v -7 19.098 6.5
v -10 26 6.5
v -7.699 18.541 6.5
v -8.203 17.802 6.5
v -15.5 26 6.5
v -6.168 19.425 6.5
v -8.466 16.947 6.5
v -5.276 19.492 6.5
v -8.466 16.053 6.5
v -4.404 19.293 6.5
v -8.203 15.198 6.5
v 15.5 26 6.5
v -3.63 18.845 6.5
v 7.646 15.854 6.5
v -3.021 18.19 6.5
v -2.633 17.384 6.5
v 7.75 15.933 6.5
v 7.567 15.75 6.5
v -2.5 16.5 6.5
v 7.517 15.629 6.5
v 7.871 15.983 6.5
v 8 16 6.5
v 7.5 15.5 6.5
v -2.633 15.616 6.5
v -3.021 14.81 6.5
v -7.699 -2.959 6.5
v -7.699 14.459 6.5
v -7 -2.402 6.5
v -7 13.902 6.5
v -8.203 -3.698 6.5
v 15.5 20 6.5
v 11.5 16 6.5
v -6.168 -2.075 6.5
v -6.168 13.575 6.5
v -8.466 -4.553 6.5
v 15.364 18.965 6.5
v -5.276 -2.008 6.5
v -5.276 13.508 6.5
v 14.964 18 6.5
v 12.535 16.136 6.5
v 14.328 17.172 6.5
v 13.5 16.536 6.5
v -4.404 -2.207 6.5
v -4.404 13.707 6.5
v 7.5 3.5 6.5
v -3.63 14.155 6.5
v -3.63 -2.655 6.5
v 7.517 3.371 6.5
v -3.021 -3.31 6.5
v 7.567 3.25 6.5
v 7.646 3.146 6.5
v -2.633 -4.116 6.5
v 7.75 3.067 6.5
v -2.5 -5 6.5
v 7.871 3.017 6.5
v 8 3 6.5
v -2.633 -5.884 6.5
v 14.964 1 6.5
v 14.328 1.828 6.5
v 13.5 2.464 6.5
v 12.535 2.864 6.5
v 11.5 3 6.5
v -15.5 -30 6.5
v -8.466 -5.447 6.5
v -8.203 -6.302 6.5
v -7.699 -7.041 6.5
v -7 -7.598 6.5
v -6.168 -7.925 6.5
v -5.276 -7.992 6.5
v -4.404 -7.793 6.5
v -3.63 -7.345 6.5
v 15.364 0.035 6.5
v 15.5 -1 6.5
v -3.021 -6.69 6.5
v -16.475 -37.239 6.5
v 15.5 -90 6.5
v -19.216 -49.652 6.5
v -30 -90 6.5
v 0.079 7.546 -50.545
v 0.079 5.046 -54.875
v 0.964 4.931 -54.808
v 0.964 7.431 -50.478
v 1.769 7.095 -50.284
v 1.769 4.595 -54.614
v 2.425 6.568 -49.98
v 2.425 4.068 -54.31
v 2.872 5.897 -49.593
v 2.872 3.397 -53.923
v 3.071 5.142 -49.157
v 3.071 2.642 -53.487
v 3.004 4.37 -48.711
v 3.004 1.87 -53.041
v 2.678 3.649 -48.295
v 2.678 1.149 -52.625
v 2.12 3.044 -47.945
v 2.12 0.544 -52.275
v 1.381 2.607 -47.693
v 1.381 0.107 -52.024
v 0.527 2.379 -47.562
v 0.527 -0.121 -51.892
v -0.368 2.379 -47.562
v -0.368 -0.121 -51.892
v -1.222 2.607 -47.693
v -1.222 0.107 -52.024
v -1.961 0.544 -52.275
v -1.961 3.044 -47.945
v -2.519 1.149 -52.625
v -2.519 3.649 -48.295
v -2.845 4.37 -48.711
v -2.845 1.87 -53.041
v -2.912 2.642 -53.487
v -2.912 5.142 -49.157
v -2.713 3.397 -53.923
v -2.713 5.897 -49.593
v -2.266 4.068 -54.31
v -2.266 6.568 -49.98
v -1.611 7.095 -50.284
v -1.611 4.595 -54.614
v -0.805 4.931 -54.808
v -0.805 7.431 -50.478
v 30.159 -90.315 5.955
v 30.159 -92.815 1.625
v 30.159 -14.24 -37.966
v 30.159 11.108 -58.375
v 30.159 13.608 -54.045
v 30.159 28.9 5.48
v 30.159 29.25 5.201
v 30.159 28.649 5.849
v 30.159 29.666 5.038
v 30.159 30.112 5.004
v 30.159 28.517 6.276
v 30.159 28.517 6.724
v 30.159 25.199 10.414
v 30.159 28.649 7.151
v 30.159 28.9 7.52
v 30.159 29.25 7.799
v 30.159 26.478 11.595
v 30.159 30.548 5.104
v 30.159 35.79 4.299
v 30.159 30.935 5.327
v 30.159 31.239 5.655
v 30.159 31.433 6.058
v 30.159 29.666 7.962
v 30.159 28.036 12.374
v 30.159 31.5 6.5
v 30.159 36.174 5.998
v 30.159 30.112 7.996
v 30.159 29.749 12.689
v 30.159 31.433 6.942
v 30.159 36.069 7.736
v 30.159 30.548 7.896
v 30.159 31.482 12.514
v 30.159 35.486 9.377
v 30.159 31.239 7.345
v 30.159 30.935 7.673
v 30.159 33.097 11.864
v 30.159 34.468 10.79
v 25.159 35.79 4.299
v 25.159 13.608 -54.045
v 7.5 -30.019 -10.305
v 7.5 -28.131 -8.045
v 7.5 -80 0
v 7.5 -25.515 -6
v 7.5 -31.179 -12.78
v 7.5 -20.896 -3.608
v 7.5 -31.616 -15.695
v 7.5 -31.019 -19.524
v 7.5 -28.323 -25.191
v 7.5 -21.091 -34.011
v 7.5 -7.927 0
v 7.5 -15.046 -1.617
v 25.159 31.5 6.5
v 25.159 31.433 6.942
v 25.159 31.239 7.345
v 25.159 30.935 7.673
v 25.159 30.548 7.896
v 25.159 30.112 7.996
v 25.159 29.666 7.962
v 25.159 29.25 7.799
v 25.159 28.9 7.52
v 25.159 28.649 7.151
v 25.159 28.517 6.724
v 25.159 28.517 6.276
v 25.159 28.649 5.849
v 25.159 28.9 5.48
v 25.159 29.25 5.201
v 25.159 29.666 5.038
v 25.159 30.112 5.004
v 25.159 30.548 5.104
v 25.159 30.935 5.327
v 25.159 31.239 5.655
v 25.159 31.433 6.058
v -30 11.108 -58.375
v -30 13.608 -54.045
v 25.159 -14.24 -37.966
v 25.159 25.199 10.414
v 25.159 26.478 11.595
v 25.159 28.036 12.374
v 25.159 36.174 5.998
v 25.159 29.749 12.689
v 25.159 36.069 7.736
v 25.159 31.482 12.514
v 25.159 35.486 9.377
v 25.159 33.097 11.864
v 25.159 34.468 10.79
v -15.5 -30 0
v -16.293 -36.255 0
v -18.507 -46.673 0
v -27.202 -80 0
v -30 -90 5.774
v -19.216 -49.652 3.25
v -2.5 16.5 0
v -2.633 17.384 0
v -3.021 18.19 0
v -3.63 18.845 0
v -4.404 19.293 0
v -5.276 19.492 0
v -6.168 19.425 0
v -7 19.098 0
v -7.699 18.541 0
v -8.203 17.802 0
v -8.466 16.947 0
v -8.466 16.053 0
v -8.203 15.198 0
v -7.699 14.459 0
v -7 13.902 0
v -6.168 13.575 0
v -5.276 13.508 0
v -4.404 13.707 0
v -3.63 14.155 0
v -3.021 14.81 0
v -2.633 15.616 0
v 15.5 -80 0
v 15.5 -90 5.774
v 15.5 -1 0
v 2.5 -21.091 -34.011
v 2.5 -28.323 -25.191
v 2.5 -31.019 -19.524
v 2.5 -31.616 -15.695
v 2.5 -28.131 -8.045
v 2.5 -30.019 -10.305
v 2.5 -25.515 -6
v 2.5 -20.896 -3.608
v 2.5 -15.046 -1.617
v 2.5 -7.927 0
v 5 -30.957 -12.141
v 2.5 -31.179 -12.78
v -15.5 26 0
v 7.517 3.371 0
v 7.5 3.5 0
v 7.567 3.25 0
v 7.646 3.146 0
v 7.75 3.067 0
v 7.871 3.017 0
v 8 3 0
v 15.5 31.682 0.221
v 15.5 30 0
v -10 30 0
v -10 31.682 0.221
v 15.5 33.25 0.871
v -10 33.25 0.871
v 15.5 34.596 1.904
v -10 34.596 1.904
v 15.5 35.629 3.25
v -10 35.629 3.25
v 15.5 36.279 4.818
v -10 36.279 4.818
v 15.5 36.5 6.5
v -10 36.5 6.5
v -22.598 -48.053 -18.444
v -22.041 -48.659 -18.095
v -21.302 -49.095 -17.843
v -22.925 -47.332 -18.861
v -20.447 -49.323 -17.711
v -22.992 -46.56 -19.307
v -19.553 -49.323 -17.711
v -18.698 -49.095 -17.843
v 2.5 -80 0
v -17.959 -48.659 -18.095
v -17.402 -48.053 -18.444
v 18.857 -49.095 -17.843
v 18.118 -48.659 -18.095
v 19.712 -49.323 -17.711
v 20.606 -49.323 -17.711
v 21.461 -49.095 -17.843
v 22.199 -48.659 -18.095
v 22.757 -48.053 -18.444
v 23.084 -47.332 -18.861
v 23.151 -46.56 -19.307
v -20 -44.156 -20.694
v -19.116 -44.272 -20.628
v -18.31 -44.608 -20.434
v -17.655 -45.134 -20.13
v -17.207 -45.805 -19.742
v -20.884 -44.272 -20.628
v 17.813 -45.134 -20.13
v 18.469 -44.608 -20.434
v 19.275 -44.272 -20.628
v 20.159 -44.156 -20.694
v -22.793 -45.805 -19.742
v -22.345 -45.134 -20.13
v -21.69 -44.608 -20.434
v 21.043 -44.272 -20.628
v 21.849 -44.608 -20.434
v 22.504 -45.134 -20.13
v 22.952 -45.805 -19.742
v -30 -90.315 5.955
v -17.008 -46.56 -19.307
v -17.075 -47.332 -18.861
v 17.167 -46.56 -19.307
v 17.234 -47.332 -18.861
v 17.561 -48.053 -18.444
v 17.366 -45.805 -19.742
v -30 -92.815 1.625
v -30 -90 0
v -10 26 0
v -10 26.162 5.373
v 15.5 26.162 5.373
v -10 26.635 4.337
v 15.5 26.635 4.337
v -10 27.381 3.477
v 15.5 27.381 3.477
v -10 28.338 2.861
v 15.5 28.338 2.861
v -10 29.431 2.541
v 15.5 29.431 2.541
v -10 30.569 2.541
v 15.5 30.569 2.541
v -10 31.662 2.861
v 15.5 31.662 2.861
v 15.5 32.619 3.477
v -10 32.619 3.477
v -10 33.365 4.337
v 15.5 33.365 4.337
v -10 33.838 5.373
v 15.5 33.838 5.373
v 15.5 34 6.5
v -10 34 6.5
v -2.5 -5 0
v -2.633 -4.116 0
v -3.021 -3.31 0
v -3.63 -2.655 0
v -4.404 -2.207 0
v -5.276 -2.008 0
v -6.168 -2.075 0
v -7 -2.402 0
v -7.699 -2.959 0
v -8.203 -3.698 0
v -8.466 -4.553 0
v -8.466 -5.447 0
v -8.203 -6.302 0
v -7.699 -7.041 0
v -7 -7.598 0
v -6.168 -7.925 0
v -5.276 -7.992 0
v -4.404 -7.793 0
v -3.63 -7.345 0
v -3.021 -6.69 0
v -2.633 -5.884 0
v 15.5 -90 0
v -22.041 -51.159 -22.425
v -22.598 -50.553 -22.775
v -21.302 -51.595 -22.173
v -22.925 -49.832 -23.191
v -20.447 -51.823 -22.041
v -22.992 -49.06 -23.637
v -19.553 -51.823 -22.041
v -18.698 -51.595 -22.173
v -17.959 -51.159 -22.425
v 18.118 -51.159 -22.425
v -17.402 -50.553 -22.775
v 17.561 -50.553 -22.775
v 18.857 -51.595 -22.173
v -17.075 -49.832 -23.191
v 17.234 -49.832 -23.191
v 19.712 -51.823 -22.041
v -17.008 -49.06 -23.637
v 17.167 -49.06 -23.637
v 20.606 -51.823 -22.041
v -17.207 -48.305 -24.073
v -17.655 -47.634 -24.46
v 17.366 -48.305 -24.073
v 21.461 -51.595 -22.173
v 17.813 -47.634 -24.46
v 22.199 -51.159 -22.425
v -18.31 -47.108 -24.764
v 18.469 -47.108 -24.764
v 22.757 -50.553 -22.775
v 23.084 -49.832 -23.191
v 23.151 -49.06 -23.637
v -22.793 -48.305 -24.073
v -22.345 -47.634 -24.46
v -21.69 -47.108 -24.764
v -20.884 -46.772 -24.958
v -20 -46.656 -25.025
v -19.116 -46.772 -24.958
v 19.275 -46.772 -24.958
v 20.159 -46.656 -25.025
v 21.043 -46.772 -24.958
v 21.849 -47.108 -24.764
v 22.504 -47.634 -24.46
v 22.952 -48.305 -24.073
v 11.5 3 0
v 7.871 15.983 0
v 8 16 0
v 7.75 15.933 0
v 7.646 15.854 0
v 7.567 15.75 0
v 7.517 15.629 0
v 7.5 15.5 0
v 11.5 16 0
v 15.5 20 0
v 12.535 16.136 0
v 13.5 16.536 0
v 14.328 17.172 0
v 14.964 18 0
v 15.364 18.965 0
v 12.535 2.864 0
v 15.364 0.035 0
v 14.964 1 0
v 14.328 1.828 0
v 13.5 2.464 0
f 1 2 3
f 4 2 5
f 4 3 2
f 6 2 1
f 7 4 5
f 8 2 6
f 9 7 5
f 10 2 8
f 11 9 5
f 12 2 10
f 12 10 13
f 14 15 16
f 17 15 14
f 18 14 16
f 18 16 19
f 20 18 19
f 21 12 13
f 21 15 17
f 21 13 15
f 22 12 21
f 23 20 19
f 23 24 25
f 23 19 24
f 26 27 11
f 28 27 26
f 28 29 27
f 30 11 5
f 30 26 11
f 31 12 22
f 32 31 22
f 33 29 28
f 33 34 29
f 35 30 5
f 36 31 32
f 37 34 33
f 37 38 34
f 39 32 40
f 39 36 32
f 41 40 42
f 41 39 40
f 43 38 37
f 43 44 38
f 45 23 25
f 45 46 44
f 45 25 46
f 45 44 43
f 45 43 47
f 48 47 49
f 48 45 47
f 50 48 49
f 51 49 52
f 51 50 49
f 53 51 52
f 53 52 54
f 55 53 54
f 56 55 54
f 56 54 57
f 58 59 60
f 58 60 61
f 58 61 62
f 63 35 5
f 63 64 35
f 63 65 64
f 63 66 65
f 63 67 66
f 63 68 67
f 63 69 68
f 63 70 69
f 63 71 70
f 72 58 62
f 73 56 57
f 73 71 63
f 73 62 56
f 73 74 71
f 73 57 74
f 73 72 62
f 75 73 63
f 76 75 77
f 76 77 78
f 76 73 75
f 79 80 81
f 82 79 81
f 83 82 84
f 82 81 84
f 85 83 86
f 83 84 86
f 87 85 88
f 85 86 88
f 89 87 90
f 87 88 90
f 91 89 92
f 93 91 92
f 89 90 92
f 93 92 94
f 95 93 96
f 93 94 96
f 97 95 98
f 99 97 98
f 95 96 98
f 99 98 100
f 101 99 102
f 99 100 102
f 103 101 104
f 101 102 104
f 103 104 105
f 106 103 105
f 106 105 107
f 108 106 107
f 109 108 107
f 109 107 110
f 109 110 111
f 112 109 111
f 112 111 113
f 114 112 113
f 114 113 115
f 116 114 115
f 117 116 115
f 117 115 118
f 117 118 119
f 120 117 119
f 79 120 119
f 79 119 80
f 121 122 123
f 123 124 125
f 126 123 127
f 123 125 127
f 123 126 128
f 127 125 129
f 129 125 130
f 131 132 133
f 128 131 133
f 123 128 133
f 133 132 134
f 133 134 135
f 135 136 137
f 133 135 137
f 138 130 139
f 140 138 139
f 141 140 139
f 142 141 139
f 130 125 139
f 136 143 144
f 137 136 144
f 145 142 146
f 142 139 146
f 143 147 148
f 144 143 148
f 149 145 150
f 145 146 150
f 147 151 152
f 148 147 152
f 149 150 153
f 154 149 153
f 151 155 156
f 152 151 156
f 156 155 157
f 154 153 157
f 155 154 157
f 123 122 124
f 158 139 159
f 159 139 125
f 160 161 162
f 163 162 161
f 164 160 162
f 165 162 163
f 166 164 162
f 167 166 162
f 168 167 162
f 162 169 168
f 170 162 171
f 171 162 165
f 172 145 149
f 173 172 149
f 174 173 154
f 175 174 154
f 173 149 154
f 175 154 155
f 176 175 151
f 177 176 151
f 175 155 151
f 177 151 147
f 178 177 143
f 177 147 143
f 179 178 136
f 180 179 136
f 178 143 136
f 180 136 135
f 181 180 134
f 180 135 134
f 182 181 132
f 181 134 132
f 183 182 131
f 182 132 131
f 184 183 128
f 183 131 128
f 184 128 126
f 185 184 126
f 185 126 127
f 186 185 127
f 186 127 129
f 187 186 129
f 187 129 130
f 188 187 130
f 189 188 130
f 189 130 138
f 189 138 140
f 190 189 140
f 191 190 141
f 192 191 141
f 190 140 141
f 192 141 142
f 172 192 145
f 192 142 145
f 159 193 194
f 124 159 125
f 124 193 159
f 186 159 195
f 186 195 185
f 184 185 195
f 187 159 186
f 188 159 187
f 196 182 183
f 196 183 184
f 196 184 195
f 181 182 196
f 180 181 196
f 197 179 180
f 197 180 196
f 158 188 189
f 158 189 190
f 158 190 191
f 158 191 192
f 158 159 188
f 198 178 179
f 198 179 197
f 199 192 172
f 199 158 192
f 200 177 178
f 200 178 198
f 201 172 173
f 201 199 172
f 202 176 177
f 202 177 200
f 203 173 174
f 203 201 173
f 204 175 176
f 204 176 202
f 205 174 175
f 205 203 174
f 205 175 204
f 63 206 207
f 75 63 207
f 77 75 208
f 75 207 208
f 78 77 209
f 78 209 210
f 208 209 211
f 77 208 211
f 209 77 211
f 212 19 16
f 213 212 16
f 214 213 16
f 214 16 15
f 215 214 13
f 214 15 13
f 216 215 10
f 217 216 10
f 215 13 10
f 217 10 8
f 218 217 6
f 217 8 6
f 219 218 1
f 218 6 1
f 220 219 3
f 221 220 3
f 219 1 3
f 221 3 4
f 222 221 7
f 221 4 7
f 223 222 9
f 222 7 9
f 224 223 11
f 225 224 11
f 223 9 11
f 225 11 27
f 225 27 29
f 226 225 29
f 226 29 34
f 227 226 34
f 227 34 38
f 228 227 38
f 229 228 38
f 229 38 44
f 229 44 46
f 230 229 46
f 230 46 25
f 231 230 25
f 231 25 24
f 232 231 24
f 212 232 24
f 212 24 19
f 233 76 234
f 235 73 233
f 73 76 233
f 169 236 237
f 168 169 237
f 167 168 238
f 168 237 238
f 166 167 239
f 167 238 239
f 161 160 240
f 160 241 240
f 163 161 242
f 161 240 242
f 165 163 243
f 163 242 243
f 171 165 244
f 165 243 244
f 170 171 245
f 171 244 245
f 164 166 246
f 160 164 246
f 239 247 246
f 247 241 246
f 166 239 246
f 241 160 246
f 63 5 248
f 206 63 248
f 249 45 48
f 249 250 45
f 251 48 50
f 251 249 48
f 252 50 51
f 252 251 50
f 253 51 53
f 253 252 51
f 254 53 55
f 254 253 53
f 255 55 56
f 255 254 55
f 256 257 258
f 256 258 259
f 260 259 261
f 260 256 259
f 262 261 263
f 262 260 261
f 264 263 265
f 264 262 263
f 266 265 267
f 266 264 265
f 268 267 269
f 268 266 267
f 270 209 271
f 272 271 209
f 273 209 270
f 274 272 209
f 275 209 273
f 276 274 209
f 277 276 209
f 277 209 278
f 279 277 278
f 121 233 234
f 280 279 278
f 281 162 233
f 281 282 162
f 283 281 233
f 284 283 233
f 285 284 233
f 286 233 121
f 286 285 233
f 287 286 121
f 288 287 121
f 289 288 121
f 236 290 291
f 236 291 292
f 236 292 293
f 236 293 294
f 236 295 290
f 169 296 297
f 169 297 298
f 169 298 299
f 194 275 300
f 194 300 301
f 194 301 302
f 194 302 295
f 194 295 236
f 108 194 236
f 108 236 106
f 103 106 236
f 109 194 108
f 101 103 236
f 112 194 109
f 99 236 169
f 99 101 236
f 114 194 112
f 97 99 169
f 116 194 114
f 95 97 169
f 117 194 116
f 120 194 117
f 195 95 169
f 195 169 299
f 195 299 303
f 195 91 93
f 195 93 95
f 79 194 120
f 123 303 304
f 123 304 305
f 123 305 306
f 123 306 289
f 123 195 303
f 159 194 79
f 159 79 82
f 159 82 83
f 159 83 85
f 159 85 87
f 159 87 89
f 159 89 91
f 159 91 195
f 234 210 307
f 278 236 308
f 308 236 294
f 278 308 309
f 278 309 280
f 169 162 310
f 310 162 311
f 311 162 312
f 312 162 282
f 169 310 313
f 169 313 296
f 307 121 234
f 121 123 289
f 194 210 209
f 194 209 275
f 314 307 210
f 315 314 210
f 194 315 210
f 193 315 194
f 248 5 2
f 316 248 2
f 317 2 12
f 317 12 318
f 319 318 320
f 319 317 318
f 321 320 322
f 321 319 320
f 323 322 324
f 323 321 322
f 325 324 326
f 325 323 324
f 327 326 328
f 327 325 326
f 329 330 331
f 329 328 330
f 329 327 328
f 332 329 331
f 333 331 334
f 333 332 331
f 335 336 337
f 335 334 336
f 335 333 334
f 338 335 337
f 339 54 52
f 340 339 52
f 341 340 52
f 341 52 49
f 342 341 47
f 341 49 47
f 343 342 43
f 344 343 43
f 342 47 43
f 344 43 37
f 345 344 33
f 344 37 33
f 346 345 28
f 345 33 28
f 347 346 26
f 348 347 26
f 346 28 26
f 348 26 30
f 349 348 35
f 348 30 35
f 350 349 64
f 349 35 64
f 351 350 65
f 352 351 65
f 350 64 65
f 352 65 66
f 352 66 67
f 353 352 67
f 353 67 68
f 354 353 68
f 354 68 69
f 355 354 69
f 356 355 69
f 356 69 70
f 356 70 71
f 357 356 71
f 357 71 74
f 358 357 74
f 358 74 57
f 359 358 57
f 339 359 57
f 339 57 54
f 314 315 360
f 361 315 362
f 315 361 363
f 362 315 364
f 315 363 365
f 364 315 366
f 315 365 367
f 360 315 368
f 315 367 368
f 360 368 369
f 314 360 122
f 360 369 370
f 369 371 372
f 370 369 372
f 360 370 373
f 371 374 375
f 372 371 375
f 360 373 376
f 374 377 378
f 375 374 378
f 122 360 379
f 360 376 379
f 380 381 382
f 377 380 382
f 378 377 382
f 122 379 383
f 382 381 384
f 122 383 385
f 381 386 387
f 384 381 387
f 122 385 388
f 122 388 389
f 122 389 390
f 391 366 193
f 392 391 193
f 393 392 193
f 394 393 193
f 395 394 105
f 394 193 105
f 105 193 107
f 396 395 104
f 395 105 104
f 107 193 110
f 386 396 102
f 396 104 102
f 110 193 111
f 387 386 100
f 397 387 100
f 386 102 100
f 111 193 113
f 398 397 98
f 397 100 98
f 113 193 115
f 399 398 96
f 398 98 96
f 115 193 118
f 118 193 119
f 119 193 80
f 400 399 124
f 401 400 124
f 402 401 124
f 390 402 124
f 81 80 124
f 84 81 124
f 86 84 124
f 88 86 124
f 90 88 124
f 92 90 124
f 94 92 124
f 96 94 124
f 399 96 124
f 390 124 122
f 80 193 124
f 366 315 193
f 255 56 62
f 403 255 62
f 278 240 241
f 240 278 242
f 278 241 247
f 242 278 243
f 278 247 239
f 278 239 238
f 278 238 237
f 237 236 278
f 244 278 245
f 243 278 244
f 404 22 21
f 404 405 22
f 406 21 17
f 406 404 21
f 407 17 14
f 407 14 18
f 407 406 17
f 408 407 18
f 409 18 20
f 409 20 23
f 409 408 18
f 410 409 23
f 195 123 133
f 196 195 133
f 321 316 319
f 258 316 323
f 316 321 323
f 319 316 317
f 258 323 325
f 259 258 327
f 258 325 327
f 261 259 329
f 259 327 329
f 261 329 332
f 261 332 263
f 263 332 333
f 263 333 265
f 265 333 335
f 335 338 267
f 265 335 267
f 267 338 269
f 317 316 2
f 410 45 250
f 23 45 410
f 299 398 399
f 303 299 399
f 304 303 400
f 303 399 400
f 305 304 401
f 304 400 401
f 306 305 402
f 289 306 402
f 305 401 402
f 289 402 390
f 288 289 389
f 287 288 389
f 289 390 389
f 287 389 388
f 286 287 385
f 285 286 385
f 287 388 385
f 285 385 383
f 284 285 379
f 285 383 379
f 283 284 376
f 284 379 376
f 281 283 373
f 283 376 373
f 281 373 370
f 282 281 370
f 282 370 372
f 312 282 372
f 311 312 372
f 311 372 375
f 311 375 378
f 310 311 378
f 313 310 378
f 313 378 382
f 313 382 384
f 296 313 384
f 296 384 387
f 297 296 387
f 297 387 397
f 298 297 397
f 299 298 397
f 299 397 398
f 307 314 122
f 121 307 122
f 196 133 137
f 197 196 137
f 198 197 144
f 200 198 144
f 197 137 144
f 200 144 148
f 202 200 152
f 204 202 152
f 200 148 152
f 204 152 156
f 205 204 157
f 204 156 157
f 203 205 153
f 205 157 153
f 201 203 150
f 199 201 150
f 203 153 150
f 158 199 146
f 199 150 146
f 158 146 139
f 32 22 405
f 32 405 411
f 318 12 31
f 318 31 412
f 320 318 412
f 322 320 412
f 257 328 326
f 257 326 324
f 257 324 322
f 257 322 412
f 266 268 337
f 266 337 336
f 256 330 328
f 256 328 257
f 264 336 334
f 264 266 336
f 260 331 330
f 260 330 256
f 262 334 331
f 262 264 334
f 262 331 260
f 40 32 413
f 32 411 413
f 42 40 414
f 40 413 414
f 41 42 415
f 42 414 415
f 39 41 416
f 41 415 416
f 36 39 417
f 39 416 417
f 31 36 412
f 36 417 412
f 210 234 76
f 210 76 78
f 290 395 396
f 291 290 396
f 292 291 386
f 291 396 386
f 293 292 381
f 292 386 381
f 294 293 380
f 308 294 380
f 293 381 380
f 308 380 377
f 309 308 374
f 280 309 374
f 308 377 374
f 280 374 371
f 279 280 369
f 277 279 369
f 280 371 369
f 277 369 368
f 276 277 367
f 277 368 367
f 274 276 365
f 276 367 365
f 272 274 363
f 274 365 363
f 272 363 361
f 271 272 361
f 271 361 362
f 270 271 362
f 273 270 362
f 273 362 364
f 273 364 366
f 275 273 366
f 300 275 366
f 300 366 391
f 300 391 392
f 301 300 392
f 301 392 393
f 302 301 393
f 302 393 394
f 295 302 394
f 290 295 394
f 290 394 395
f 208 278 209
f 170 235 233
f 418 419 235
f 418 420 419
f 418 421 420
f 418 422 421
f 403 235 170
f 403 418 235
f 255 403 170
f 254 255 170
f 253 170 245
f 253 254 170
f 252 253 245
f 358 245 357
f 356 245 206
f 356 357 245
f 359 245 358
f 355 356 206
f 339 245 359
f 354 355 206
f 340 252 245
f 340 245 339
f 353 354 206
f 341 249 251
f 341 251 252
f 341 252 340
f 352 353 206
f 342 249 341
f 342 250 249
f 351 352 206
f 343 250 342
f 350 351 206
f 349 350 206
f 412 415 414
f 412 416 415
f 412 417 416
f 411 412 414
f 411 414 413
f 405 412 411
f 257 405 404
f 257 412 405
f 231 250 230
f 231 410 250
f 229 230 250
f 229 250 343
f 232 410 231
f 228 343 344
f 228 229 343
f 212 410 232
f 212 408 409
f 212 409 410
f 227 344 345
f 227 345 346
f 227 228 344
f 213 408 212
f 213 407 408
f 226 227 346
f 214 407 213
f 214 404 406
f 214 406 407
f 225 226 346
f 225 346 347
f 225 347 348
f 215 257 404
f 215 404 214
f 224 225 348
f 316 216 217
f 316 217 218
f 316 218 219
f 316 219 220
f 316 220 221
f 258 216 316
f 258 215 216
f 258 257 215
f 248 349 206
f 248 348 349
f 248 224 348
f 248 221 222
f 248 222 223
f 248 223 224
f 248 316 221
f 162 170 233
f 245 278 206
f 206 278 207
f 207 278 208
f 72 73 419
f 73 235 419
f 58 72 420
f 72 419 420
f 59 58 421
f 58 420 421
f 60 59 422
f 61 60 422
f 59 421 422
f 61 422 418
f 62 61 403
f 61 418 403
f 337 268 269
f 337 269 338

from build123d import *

# Parameters (mm, degrees)
BOSS_EXTRUDE1_DEPTH = 6.5
SKETCH2_W           = 60.158889846
SKETCH2_H           = 120
BOSS_EXTRUDE3_DEPTH = 5
SKETCH6_R           = 3
CUT_EXTRUDE7_DEPTH  = 5.1
BOSS_EXTRUDE4_DEPTH = 31
CUT_EXTRUDE8_REACH  = 119.187
SKETCH11_W          = 5.5
SKETCH11_H          = 10.5
CUT_EXTRUDE11_REACH = 119.187
SKETCH14_R          = 3
SKETCH29_R          = 1.5
BOSS_EXTRUDE6_DEPTH = 5
RIB6_START          = -2.5
RIB6_DEPTH          = 5
CUT_EXTRUDE14_REACH = 118.769
CUT_EXTRUDE15_REACH = 119.187
SKETCH66_W          = 8
SKETCH66_H          = 13
FILLET3_R           = 4
FILLET4_R           = 0.5


# Read off the part's stored shape, not the designer's step: Rib6
with BuildPart() as part:
    # Sketch1 → Boss-Extrude1 (new body)
    with BuildSketch(Plane.XY):
        with BuildLine():
            Line((-15.5, -30), (-15.5, 30))
            Line((-15.5, 30), (15.5, 30))
            Line((15.5, 30), (15.5, -30))
            Line((15.5, -30), (15.5, -90))
            Line((15.5, -90), (-30, -90))
            add(Edge.make_bspline(
                [(-15.5, -30), (-15.682751911, -39.304401058), (-30, -90)],
                knots=[0.243669215, 0.243669215, 0.243669215, 1, 1, 1], degree=2))
        make_face()
    extrude(amount=BOSS_EXTRUDE1_DEPTH)

    # Sketch2 → Boss-Extrude3 (add)
    with BuildSketch(Plane(origin=(0, -22.5, -38.97114317), x_dir=(1, 0, 0), z_dir=(0, 0.500000000000001, 0.866025403784438))):
        with Locations((0.079444923, -21.192286341)):
            Rectangle(SKETCH2_W, SKETCH2_H)
    extrude(amount=BOSS_EXTRUDE3_DEPTH)

    # Sketch6 → Cut-Extrude7 (cut)
    with BuildSketch(Plane(origin=(0, -22.5, -38.97114317), x_dir=(-1, 0, 0), z_dir=(0, -0.5000000000000012, -0.866025403784438))):
        with Locations(Location((-20.158889846, -30.893082241, 0), (0, 0, 90))):
            Circle(SKETCH6_R)
        with Locations(Location((20, -30.893082241, 0), (0, 0, 90))):
            Circle(SKETCH6_R)
        with Locations(Location((-0.079444923, 28.807713659, 0), (0, 0, 90))):
            Circle(SKETCH6_R)
    extrude(amount=-CUT_EXTRUDE7_DEPTH, mode=Mode.SUBTRACT)

    # Sketch10 → Boss-Extrude4 (add)
    with BuildSketch(Plane(origin=(15.5, 0, 0), x_dir=(0, 0, -1), z_dir=(1, 0, 0))):
        with BuildLine():
            Line((-6.5, 36.5), (-6.5, 30))
            Line((-6.5, 30), (0, 30))
            ThreePointArc((0, 30), (-1.903805922, 34.596194078), (-6.5, 36.5))
        make_face()
    extrude(amount=-BOSS_EXTRUDE4_DEPTH)

    # Sketch11 → Cut-Extrude8 (cut, up to next)
    with BuildSketch(Plane.XY.offset(6.5), mode=Mode.PRIVATE) as cut_extrude8_sk1:
        with Locations((-12.75, 31.25)):
            Rectangle(SKETCH11_W, SKETCH11_H)
    cut_extrude8_tool1 = extrude(cut_extrude8_sk1.sketch, amount=-CUT_EXTRUDE8_REACH, mode=Mode.PRIVATE) & part.part
    add(cut_extrude8_tool1.solids().sort_by_distance((-12.75, 31.25, 6.5))[0], mode=Mode.SUBTRACT)

    # Sketch14 → Cut-Extrude11 (cut, up to next)
    with BuildSketch(Plane.XY.offset(6.5), mode=Mode.PRIVATE) as cut_extrude11_sk1:
        with Locations((-5.5, 16.5)):
            Circle(SKETCH14_R)
    cut_extrude11_tool1 = extrude(cut_extrude11_sk1.sketch, amount=-CUT_EXTRUDE11_REACH, mode=Mode.PRIVATE) & part.part
    # Sketch14 → Cut-Extrude11 (cut, up to next)
    with BuildSketch(Plane.XY.offset(6.5), mode=Mode.PRIVATE) as cut_extrude11_sk2:
        with Locations((-5.5, -5)):
            Circle(SKETCH14_R)
    cut_extrude11_tool2 = extrude(cut_extrude11_sk2.sketch, amount=-CUT_EXTRUDE11_REACH, mode=Mode.PRIVATE) & part.part
    add(cut_extrude11_tool1.solids().sort_by_distance((-5.5, 16.5, 6.5))[0], mode=Mode.SUBTRACT)
    add(cut_extrude11_tool2.solids().sort_by_distance((-5.5, -5, 6.5))[0], mode=Mode.SUBTRACT)

    # Sketch29 → Boss-Extrude6 (add)
    with BuildSketch(Plane(origin=(30.158889846, 0, 0), x_dir=(0, 0, -1), z_dir=(1, 0, 0))):
        with BuildLine():
            Line((-4.298836218, 35.789748924), (54.044872981, 13.608465892))
            Line((54.044872981, 13.608465892), (37.966397208, -14.240271055))
            Line((37.966397208, -14.240271055), (-10.413719231, 25.199050471))
            ThreePointArc((-10.413719231, 25.199050471), (-11.864134131, 33.0971567), (-4.298836218, 35.789748924))
        make_face()
        with Locations(Location((-6.5, 30, 0), (0, 0, 90))):
            Circle(SKETCH29_R, mode=Mode.SUBTRACT)
    extrude(amount=-BOSS_EXTRUDE6_DEPTH)

    # Rib6 outline → Rib6 (add)
    with BuildSketch(Plane(origin=(5, 0, 0), x_dir=(0, 0, -1), z_dir=(1, 0, 0)).offset(RIB6_START)):
        with BuildLine():
            Line((0, -80), (34.010848977, -21.091481564))
            add(Edge.make_bspline(
                [(34.010848977, -21.091481564), (7.27651008, -47.405497337), (0, -7.927359395)],
                knots=[0, 0, 0, 1, 1, 1], degree=2))
            Line((0, -7.927359395), (0, -80))
        make_face()
    extrude(amount=RIB6_DEPTH)

    # Sketch65 → Cut-Extrude14 (cut, up to next)
    with BuildSketch(Plane.ZY.offset(10), mode=Mode.PRIVATE) as cut_extrude14_sk1:
        with BuildLine():
            Line((6.5, 34), (6.5, 26))
            ThreePointArc((6.5, 26), (2.5, 30), (6.5, 34))
        make_face()
    cut_extrude14_tool1 = extrude(cut_extrude14_sk1.sketch, amount=-CUT_EXTRUDE14_REACH, mode=Mode.PRIVATE) & part.part
    add(cut_extrude14_tool1.solids().sort_by_distance((-10, 30, 4.802347))[0], mode=Mode.SUBTRACT)

    # Sketch66 → Cut-Extrude15 (cut, up to next)
    with BuildSketch(Plane.XY.offset(6.5), mode=Mode.PRIVATE) as cut_extrude15_sk1:
        with Locations((11.5, 9.5)):
            Rectangle(SKETCH66_W, SKETCH66_H)
    cut_extrude15_tool1 = extrude(cut_extrude15_sk1.sketch, amount=-CUT_EXTRUDE15_REACH, mode=Mode.PRIVATE) & part.part
    add(cut_extrude15_tool1.solids().sort_by_distance((11.5, 9.5, 6.5))[0], mode=Mode.SUBTRACT)

    # Fillet3
    fillet3_edges = [part.edges().sort_by_distance(p)[0] for p in [
        (15.5, 16, 3.25),
        (15.5, 3, 3.25),
    ]]
    fillet(fillet3_edges, radius=FILLET3_R)

    # Fillet4
    fillet4_edges = [part.edges().sort_by_distance(p)[0] for p in [
        (7.5, 3, 3.25),
        (7.5, 16, 3.25),
    ]]
    fillet(fillet4_edges, radius=FILLET4_R)


solid = part.part
